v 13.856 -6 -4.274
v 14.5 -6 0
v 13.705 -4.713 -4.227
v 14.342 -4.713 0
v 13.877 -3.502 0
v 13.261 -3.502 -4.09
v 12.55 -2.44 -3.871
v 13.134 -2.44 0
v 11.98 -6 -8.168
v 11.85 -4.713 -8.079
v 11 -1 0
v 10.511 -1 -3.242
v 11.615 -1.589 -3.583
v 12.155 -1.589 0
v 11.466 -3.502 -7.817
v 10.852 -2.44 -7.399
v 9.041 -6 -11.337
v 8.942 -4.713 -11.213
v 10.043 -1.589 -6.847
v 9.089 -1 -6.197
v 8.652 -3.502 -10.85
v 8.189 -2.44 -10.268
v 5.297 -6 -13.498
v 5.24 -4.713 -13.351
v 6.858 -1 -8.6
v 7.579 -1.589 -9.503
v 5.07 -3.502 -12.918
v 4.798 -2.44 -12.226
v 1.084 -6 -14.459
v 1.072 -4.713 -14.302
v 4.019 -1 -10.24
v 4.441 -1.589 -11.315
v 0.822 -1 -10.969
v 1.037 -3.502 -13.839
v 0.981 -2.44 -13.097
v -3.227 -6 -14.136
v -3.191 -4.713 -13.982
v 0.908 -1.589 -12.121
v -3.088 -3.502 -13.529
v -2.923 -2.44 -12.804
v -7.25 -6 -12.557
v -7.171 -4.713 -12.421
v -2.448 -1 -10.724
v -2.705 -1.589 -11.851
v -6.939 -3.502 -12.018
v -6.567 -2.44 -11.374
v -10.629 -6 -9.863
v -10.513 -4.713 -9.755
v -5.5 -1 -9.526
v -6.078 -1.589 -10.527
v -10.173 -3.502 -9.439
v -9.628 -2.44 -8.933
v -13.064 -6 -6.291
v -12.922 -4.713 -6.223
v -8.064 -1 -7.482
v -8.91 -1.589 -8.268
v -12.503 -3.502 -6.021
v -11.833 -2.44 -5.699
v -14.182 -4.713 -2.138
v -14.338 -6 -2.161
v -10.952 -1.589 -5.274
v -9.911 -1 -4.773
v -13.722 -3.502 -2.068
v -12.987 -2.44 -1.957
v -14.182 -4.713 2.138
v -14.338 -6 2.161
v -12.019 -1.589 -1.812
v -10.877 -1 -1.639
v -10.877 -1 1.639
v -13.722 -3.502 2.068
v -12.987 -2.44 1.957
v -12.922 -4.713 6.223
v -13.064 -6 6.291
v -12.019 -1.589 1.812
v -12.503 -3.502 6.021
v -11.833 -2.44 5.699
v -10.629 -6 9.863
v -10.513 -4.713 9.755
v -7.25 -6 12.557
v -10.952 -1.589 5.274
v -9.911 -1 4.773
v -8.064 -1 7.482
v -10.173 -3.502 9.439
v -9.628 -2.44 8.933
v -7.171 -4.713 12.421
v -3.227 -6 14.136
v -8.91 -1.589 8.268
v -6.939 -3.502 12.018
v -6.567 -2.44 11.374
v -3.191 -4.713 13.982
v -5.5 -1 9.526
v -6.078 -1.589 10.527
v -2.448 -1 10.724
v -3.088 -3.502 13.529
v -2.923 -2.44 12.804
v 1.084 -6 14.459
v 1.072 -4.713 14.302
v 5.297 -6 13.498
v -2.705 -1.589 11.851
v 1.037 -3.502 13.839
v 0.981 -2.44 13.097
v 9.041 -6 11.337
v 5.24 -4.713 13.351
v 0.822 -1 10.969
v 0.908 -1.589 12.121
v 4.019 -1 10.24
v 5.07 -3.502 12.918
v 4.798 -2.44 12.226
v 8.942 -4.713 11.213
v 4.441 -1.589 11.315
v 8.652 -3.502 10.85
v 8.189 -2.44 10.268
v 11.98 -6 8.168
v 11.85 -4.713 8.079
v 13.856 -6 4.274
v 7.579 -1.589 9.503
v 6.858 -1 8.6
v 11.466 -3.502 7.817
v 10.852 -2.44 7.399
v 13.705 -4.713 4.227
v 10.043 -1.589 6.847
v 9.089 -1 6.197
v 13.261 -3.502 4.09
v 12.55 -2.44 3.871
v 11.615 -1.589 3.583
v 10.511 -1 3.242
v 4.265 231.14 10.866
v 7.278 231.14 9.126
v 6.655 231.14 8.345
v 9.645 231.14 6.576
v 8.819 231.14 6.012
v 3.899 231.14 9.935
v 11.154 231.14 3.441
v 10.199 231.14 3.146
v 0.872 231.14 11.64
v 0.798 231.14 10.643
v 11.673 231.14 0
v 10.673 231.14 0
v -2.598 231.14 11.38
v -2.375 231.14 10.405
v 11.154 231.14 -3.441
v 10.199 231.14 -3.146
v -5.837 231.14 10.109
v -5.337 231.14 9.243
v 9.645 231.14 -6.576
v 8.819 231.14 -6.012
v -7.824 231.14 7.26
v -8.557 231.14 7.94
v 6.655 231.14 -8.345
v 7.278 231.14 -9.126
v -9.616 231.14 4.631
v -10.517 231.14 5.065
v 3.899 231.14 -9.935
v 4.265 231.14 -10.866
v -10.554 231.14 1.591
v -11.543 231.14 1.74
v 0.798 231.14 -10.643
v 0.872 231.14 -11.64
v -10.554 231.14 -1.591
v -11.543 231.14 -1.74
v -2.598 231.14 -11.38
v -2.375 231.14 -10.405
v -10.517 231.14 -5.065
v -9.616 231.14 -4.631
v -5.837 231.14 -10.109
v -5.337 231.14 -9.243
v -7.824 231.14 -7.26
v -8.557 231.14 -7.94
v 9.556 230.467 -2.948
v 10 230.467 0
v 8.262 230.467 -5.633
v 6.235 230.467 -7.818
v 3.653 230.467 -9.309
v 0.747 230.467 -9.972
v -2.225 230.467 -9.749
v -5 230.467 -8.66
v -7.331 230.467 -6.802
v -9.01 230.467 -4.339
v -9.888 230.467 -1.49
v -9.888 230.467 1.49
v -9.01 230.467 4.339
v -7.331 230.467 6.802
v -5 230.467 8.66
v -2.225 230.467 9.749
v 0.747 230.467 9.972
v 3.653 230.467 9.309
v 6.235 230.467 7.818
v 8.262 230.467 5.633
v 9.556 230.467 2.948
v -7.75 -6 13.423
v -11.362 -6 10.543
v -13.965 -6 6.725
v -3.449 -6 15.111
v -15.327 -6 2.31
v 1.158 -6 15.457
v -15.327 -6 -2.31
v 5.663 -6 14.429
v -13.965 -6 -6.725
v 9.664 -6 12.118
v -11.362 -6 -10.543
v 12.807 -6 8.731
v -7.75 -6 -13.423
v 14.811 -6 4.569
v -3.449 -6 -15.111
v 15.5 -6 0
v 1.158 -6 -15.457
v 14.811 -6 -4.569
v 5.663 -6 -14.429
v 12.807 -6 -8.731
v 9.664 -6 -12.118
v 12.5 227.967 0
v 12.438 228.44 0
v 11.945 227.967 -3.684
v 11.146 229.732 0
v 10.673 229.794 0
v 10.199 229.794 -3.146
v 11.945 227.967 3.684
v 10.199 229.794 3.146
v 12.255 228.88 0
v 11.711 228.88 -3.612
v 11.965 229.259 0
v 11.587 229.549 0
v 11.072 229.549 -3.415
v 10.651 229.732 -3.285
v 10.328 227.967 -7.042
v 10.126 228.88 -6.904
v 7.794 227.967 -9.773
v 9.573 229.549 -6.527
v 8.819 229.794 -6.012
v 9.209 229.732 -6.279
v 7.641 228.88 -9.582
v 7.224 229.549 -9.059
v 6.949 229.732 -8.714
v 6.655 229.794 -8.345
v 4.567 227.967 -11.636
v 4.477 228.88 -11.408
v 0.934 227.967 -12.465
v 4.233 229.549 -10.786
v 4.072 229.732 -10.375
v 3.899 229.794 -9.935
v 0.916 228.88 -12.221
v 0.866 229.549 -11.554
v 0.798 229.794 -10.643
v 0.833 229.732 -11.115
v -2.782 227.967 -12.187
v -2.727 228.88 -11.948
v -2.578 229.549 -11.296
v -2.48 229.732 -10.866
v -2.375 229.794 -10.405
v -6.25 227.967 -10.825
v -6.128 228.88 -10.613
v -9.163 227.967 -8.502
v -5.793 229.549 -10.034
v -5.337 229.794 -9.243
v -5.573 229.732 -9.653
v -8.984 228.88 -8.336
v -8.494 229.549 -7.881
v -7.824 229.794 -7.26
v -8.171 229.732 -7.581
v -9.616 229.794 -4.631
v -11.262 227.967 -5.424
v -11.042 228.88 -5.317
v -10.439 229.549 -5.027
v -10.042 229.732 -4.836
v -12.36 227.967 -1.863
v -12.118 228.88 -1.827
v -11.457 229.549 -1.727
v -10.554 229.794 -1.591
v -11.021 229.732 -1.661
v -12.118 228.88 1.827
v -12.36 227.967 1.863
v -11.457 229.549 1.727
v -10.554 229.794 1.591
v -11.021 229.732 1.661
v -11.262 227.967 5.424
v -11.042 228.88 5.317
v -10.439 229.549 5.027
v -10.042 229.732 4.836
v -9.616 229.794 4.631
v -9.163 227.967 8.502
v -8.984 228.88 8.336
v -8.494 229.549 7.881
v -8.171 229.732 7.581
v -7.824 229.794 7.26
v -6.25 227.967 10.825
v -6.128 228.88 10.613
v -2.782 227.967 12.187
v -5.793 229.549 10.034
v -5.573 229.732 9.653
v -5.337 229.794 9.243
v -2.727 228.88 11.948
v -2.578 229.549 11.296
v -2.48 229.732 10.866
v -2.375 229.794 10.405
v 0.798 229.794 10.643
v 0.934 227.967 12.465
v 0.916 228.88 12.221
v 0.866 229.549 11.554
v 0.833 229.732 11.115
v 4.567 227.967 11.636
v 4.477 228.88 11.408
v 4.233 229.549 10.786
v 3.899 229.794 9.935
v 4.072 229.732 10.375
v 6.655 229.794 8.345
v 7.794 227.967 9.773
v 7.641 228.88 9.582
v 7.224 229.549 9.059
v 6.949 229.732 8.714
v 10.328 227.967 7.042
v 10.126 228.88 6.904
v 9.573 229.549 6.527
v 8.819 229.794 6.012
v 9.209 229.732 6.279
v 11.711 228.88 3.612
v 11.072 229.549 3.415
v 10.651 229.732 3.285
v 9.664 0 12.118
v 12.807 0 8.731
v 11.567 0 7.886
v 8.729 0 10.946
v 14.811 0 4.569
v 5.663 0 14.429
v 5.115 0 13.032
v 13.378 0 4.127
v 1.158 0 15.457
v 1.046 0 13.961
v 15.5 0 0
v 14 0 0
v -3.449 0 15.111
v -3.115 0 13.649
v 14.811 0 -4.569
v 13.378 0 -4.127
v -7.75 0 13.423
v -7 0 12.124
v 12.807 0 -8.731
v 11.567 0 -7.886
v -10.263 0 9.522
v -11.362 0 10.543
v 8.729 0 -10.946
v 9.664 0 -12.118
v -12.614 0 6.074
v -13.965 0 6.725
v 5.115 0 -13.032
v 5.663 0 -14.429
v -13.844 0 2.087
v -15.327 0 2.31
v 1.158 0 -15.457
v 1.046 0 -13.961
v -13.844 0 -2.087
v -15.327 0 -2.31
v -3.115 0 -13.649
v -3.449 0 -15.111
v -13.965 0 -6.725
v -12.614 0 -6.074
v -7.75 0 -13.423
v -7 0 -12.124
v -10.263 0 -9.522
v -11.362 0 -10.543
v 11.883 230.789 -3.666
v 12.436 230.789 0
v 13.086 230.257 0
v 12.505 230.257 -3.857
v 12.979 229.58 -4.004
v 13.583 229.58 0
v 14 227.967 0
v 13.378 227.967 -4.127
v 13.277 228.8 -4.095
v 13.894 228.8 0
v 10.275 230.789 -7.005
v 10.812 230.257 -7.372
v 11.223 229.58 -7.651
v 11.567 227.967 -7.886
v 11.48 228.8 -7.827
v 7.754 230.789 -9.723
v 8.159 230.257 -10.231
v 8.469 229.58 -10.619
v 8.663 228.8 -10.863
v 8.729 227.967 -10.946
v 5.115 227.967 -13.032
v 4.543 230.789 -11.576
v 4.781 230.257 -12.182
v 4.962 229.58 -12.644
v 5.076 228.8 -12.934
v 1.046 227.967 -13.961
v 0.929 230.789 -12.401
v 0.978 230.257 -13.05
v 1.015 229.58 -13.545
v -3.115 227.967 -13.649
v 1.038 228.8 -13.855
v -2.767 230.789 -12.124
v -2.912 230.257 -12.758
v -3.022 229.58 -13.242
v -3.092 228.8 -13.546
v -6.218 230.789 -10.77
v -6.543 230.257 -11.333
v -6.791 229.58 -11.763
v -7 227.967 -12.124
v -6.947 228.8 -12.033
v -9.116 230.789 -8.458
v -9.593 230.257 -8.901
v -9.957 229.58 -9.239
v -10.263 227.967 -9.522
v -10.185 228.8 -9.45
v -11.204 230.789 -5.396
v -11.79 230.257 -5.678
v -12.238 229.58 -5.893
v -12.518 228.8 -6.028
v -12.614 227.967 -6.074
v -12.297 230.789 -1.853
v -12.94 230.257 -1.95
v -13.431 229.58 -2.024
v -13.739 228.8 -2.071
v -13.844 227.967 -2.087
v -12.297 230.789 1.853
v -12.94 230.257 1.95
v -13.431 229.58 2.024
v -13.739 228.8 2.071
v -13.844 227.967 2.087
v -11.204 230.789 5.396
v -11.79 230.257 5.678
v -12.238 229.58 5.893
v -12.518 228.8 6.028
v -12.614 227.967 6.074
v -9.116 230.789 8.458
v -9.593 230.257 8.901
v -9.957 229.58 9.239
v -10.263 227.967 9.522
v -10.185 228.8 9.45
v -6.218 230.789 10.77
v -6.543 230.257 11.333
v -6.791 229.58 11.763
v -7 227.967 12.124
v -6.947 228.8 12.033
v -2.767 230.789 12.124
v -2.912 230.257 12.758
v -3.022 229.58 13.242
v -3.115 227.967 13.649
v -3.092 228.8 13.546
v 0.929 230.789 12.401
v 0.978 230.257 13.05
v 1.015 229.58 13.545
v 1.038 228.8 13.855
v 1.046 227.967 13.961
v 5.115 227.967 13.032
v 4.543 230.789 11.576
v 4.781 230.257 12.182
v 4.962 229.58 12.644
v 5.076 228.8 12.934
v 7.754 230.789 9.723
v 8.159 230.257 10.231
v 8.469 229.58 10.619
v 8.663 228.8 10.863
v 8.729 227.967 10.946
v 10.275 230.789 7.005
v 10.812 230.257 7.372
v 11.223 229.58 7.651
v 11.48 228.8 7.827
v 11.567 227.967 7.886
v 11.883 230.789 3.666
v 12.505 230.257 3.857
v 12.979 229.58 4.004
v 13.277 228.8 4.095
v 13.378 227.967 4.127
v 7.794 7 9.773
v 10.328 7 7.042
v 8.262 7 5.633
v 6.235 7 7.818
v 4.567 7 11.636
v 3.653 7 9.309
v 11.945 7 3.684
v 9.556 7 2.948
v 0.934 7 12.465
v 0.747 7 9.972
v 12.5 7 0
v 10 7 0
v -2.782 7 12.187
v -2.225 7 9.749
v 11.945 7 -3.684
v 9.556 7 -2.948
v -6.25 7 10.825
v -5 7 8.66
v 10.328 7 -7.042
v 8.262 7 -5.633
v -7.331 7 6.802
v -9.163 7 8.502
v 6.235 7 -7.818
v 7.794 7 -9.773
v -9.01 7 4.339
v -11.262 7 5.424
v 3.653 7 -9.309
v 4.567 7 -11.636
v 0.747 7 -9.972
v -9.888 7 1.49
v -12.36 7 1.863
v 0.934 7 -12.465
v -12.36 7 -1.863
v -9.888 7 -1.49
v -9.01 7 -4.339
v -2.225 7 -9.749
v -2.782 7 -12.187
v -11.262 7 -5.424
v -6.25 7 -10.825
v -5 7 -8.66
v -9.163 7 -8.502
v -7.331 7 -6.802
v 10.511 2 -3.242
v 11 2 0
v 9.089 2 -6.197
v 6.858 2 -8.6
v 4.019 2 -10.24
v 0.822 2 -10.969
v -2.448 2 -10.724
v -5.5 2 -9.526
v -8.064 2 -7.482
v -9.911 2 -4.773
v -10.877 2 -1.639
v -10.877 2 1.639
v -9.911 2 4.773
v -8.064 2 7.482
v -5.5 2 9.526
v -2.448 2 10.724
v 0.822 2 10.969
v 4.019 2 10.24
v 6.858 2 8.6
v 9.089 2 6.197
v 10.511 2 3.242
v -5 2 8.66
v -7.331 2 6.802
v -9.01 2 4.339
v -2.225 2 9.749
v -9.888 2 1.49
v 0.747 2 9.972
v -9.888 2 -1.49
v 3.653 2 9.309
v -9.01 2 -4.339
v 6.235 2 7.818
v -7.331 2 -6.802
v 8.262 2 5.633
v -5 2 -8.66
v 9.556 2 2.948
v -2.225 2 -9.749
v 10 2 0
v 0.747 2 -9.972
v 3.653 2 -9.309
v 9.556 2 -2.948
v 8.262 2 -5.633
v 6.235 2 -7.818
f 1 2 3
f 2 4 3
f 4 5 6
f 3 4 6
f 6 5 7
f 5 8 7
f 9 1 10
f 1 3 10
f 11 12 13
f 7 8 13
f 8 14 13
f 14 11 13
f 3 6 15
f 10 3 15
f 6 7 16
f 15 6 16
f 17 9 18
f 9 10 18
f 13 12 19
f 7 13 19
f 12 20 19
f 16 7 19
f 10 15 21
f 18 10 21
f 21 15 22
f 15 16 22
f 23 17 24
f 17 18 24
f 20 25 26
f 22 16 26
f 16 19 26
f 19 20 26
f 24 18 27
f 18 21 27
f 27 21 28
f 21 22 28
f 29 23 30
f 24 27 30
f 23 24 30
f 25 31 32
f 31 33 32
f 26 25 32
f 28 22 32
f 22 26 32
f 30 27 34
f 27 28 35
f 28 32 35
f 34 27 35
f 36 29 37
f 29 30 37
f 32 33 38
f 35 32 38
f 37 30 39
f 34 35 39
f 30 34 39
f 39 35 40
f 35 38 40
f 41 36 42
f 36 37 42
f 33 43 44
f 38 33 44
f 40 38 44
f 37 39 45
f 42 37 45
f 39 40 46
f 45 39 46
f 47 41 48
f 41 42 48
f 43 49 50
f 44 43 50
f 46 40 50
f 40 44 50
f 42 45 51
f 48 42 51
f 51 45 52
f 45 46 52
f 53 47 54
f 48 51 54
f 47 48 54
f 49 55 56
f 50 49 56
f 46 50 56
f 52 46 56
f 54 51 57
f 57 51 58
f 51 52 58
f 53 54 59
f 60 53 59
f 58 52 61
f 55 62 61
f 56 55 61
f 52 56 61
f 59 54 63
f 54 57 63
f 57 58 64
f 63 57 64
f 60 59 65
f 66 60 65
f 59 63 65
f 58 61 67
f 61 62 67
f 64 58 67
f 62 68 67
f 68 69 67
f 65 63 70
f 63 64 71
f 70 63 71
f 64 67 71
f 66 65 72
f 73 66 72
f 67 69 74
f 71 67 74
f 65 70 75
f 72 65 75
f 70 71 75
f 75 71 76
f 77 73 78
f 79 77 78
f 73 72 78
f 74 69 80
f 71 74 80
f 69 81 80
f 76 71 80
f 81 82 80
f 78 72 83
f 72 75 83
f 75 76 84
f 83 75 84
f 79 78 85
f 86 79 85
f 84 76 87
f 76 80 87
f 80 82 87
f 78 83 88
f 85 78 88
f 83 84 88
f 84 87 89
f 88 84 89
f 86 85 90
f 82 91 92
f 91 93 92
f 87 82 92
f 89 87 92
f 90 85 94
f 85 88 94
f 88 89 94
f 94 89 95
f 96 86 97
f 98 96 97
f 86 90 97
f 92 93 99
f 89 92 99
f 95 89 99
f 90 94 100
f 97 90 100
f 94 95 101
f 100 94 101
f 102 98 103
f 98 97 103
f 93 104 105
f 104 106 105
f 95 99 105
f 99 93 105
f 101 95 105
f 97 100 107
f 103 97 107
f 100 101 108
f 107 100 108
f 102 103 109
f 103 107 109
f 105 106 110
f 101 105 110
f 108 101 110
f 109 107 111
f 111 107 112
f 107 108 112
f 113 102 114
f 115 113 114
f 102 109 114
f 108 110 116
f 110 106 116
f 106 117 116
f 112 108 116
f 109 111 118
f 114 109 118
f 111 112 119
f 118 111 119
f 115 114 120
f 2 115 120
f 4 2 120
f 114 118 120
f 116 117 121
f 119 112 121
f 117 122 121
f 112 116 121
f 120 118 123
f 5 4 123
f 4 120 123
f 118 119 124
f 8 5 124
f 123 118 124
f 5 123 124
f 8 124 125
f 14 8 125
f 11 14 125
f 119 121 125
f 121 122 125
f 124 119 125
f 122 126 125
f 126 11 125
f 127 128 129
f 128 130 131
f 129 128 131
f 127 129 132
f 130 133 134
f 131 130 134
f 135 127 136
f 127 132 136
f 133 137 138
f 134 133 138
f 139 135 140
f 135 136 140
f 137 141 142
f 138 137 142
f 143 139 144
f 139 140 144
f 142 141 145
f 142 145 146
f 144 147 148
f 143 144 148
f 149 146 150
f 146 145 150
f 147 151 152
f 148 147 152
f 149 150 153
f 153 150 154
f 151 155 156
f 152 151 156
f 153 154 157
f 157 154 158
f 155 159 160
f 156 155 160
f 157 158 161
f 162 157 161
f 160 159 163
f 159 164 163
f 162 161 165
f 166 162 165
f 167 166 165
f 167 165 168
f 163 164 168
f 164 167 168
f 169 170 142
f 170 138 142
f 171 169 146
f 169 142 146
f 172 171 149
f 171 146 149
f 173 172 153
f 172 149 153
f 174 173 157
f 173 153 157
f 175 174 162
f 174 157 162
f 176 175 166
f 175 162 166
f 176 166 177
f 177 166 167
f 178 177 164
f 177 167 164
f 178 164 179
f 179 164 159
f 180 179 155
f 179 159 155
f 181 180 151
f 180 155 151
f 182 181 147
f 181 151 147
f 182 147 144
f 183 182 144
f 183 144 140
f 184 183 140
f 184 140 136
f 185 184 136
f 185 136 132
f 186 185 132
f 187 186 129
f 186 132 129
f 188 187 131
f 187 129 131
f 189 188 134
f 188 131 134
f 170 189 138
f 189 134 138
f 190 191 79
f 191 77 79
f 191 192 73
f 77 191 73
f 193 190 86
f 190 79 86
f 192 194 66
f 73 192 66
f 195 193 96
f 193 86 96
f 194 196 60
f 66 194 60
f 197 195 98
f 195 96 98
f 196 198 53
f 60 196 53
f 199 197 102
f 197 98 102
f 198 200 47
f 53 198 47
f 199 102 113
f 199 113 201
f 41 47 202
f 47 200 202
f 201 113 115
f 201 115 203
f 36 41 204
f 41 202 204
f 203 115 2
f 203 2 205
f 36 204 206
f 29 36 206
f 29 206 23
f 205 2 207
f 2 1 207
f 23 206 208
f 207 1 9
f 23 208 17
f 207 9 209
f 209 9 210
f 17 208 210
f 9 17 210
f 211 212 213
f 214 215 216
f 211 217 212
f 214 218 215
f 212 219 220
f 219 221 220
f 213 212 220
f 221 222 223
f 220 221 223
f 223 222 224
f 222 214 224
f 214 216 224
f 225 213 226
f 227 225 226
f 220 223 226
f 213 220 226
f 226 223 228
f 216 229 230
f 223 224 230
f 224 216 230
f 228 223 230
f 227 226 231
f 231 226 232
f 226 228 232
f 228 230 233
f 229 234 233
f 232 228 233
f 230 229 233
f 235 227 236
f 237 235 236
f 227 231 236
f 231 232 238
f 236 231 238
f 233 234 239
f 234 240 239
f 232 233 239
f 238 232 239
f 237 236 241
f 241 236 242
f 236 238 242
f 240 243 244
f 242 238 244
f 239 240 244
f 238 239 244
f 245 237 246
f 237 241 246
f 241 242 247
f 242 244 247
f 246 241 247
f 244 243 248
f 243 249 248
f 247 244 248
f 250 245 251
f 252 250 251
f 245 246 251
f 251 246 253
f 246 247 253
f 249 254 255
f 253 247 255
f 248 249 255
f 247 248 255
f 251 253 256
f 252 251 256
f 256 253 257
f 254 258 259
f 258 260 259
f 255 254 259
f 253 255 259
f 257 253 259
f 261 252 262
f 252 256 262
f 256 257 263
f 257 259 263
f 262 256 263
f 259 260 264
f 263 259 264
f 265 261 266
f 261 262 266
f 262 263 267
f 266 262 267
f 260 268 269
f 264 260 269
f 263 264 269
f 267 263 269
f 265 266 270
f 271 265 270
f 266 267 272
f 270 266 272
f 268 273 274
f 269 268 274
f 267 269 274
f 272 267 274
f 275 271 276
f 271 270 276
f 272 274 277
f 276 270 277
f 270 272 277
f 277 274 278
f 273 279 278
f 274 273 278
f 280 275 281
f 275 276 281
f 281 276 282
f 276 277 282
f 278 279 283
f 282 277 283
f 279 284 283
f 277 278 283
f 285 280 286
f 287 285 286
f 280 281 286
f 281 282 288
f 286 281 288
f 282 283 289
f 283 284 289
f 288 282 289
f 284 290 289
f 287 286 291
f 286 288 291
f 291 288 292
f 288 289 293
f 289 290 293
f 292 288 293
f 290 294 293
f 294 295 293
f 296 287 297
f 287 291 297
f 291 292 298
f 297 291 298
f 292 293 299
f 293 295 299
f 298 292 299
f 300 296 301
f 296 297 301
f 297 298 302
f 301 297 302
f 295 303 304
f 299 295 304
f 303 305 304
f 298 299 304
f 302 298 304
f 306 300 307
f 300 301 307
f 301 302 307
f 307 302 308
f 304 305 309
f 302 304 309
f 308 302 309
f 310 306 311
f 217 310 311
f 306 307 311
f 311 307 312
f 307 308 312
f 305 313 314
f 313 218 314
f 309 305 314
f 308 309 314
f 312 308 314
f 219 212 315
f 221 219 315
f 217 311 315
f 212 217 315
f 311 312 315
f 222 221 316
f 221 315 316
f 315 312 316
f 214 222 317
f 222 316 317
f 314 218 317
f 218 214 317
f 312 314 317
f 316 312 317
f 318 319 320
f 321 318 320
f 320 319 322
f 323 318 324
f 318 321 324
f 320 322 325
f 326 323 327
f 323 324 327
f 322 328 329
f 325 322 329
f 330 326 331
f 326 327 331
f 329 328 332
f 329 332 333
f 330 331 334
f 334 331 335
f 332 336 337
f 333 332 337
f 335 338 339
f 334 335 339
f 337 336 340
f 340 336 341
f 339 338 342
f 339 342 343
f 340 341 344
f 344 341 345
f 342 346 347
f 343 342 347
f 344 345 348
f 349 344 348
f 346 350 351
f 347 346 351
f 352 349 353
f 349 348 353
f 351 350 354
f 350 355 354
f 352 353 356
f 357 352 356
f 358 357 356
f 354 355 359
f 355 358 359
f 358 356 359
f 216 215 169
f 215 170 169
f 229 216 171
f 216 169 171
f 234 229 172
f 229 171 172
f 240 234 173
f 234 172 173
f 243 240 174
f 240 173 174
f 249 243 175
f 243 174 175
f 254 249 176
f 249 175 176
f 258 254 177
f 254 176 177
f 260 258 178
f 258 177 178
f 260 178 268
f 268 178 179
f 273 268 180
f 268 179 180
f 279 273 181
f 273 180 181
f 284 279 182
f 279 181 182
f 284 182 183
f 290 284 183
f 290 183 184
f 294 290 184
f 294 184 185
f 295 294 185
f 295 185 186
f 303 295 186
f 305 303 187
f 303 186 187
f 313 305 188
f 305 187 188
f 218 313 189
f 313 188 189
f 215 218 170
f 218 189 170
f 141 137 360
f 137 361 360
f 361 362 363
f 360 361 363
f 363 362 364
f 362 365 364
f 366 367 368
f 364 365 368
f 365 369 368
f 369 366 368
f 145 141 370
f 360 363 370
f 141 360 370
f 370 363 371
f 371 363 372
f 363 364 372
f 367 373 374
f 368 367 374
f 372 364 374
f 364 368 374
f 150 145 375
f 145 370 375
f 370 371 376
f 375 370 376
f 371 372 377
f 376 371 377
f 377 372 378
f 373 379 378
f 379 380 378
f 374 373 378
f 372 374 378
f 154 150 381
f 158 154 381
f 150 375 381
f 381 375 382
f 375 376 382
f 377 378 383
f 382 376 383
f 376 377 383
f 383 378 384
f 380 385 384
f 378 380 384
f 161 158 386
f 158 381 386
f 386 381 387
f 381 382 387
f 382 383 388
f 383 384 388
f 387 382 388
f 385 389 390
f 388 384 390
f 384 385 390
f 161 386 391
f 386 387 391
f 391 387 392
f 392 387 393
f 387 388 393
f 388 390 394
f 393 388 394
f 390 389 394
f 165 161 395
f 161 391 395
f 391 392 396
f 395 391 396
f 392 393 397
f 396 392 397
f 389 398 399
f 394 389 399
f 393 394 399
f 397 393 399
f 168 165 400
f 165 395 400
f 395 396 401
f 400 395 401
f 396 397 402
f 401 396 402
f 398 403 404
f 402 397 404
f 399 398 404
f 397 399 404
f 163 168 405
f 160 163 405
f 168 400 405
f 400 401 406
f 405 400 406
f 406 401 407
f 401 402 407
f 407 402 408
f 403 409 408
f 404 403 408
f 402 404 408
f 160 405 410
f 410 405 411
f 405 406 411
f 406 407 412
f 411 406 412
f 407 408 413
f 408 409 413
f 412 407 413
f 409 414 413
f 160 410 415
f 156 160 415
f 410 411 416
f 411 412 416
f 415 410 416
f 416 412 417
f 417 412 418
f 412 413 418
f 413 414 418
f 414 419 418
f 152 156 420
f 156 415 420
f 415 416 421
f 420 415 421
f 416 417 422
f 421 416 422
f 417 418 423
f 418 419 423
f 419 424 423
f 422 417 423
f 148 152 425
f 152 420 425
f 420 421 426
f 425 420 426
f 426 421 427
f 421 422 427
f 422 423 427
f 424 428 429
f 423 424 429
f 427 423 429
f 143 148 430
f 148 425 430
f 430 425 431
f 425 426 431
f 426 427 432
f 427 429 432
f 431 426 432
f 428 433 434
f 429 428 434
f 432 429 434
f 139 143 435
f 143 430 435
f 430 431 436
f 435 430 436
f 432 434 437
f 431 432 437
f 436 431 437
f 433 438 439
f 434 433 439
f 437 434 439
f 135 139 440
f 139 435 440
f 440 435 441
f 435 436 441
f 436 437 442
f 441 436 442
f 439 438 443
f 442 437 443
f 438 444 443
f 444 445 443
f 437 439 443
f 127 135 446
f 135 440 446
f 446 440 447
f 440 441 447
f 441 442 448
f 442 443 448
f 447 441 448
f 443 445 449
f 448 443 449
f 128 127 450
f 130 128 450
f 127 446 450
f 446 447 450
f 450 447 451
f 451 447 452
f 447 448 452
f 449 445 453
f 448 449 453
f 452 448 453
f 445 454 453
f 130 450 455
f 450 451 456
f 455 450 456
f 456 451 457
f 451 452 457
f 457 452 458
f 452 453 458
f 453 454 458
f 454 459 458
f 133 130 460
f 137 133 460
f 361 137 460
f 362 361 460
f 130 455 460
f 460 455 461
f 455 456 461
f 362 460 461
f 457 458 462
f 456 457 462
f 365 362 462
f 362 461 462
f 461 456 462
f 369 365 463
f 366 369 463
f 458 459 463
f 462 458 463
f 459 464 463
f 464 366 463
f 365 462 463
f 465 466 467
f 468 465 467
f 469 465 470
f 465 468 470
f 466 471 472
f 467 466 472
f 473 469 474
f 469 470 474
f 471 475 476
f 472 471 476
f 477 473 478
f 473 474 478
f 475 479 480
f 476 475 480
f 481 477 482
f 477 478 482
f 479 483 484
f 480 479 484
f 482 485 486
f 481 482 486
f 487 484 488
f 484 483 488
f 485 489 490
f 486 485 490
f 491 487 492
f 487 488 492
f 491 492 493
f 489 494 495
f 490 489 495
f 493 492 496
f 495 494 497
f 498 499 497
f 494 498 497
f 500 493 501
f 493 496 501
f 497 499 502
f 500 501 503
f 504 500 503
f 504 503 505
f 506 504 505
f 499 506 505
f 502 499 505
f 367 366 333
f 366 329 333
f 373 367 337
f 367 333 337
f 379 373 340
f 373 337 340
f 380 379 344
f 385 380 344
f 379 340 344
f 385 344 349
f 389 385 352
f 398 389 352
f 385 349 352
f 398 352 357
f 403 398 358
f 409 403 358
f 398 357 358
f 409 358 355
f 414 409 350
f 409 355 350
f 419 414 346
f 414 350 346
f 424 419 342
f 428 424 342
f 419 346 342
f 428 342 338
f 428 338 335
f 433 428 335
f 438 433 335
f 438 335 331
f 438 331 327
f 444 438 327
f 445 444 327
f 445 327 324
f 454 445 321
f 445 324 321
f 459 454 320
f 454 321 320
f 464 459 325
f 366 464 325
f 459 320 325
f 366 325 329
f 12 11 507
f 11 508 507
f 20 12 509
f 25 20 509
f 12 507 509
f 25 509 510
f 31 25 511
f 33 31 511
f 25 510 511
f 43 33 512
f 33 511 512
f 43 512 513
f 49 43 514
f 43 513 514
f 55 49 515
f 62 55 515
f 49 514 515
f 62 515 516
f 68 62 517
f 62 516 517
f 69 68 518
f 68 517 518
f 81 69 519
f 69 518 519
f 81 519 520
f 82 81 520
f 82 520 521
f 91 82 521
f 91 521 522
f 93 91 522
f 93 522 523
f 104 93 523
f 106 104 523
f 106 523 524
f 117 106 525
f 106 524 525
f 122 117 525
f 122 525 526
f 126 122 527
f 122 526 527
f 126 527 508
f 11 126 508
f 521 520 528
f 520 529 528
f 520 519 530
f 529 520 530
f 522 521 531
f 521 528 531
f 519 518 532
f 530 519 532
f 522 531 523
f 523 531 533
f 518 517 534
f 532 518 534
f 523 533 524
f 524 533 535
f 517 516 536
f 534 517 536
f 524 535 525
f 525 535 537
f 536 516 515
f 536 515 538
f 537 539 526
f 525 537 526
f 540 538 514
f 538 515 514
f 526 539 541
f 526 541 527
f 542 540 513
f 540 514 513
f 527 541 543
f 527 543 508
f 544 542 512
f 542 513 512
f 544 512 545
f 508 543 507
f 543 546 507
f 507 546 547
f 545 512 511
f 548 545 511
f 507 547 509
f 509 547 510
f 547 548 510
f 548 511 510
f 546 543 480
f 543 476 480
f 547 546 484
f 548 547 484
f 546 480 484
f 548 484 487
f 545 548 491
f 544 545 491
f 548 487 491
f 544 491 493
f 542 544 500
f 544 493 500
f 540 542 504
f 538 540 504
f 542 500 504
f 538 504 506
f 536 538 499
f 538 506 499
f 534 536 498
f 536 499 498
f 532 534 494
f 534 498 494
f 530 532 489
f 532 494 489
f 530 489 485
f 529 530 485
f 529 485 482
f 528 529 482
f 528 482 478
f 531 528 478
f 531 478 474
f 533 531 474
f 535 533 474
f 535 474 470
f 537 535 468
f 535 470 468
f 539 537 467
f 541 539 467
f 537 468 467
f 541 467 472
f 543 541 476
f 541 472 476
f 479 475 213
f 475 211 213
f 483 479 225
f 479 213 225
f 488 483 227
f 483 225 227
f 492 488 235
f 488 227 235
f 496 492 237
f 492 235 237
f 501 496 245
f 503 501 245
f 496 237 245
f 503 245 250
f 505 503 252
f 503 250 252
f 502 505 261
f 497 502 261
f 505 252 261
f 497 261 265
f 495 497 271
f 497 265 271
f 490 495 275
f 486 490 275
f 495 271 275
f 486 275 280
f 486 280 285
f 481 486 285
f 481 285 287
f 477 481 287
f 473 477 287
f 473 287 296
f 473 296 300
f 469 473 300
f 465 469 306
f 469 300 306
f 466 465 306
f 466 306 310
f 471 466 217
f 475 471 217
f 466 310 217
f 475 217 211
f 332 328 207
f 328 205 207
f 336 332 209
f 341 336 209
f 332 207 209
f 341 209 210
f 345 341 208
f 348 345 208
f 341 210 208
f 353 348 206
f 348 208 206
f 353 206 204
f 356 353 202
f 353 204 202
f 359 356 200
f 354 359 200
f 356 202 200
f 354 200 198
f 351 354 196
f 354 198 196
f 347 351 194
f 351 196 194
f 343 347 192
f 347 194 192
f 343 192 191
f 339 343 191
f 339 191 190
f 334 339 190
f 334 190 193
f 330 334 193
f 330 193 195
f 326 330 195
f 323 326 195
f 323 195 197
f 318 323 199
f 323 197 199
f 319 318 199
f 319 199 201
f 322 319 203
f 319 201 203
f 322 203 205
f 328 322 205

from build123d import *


with BuildPart() as part:
    # Sketch1 → Revolve1 (revolve)
    with BuildSketch(Plane.XY):
        with BuildLine():
            Line((12.5, 7), (12.5, 227.966923077))
            ThreePointArc((12.5, 227.966923077), (11.964906619, 229.258752773), (10.673076923, 229.793846154))
            Line((10.673076923, 229.793846154), (10, 230.466923077))
            Line((10, 230.466923077), (10.673076923, 231.14))
            Line((10.673076923, 231.14), (11.673076923, 231.14))
            ThreePointArc((11.673076923, 231.14), (13.355924313, 229.934344496), (14, 227.966923077))
            Line((14, 227.966923077), (14, 0))
            Line((14, 0), (15.5, 0))
            Line((15.5, 0), (15.5, -6))
            Line((15.5, -6), (14.5, -6))
            ThreePointArc((14.5, -6), (13.538055577, -2.948361096), (11, -1))
            Line((11, -1), (11, 2))
            Line((11, 2), (10, 2))
            Line((10, 2), (10, 7))
            Line((10, 7), (12.5, 7))
        make_face()
    revolve(axis=Axis((0, -1085.204253018, 0), (0, 1, 0)))


solid = part.part
